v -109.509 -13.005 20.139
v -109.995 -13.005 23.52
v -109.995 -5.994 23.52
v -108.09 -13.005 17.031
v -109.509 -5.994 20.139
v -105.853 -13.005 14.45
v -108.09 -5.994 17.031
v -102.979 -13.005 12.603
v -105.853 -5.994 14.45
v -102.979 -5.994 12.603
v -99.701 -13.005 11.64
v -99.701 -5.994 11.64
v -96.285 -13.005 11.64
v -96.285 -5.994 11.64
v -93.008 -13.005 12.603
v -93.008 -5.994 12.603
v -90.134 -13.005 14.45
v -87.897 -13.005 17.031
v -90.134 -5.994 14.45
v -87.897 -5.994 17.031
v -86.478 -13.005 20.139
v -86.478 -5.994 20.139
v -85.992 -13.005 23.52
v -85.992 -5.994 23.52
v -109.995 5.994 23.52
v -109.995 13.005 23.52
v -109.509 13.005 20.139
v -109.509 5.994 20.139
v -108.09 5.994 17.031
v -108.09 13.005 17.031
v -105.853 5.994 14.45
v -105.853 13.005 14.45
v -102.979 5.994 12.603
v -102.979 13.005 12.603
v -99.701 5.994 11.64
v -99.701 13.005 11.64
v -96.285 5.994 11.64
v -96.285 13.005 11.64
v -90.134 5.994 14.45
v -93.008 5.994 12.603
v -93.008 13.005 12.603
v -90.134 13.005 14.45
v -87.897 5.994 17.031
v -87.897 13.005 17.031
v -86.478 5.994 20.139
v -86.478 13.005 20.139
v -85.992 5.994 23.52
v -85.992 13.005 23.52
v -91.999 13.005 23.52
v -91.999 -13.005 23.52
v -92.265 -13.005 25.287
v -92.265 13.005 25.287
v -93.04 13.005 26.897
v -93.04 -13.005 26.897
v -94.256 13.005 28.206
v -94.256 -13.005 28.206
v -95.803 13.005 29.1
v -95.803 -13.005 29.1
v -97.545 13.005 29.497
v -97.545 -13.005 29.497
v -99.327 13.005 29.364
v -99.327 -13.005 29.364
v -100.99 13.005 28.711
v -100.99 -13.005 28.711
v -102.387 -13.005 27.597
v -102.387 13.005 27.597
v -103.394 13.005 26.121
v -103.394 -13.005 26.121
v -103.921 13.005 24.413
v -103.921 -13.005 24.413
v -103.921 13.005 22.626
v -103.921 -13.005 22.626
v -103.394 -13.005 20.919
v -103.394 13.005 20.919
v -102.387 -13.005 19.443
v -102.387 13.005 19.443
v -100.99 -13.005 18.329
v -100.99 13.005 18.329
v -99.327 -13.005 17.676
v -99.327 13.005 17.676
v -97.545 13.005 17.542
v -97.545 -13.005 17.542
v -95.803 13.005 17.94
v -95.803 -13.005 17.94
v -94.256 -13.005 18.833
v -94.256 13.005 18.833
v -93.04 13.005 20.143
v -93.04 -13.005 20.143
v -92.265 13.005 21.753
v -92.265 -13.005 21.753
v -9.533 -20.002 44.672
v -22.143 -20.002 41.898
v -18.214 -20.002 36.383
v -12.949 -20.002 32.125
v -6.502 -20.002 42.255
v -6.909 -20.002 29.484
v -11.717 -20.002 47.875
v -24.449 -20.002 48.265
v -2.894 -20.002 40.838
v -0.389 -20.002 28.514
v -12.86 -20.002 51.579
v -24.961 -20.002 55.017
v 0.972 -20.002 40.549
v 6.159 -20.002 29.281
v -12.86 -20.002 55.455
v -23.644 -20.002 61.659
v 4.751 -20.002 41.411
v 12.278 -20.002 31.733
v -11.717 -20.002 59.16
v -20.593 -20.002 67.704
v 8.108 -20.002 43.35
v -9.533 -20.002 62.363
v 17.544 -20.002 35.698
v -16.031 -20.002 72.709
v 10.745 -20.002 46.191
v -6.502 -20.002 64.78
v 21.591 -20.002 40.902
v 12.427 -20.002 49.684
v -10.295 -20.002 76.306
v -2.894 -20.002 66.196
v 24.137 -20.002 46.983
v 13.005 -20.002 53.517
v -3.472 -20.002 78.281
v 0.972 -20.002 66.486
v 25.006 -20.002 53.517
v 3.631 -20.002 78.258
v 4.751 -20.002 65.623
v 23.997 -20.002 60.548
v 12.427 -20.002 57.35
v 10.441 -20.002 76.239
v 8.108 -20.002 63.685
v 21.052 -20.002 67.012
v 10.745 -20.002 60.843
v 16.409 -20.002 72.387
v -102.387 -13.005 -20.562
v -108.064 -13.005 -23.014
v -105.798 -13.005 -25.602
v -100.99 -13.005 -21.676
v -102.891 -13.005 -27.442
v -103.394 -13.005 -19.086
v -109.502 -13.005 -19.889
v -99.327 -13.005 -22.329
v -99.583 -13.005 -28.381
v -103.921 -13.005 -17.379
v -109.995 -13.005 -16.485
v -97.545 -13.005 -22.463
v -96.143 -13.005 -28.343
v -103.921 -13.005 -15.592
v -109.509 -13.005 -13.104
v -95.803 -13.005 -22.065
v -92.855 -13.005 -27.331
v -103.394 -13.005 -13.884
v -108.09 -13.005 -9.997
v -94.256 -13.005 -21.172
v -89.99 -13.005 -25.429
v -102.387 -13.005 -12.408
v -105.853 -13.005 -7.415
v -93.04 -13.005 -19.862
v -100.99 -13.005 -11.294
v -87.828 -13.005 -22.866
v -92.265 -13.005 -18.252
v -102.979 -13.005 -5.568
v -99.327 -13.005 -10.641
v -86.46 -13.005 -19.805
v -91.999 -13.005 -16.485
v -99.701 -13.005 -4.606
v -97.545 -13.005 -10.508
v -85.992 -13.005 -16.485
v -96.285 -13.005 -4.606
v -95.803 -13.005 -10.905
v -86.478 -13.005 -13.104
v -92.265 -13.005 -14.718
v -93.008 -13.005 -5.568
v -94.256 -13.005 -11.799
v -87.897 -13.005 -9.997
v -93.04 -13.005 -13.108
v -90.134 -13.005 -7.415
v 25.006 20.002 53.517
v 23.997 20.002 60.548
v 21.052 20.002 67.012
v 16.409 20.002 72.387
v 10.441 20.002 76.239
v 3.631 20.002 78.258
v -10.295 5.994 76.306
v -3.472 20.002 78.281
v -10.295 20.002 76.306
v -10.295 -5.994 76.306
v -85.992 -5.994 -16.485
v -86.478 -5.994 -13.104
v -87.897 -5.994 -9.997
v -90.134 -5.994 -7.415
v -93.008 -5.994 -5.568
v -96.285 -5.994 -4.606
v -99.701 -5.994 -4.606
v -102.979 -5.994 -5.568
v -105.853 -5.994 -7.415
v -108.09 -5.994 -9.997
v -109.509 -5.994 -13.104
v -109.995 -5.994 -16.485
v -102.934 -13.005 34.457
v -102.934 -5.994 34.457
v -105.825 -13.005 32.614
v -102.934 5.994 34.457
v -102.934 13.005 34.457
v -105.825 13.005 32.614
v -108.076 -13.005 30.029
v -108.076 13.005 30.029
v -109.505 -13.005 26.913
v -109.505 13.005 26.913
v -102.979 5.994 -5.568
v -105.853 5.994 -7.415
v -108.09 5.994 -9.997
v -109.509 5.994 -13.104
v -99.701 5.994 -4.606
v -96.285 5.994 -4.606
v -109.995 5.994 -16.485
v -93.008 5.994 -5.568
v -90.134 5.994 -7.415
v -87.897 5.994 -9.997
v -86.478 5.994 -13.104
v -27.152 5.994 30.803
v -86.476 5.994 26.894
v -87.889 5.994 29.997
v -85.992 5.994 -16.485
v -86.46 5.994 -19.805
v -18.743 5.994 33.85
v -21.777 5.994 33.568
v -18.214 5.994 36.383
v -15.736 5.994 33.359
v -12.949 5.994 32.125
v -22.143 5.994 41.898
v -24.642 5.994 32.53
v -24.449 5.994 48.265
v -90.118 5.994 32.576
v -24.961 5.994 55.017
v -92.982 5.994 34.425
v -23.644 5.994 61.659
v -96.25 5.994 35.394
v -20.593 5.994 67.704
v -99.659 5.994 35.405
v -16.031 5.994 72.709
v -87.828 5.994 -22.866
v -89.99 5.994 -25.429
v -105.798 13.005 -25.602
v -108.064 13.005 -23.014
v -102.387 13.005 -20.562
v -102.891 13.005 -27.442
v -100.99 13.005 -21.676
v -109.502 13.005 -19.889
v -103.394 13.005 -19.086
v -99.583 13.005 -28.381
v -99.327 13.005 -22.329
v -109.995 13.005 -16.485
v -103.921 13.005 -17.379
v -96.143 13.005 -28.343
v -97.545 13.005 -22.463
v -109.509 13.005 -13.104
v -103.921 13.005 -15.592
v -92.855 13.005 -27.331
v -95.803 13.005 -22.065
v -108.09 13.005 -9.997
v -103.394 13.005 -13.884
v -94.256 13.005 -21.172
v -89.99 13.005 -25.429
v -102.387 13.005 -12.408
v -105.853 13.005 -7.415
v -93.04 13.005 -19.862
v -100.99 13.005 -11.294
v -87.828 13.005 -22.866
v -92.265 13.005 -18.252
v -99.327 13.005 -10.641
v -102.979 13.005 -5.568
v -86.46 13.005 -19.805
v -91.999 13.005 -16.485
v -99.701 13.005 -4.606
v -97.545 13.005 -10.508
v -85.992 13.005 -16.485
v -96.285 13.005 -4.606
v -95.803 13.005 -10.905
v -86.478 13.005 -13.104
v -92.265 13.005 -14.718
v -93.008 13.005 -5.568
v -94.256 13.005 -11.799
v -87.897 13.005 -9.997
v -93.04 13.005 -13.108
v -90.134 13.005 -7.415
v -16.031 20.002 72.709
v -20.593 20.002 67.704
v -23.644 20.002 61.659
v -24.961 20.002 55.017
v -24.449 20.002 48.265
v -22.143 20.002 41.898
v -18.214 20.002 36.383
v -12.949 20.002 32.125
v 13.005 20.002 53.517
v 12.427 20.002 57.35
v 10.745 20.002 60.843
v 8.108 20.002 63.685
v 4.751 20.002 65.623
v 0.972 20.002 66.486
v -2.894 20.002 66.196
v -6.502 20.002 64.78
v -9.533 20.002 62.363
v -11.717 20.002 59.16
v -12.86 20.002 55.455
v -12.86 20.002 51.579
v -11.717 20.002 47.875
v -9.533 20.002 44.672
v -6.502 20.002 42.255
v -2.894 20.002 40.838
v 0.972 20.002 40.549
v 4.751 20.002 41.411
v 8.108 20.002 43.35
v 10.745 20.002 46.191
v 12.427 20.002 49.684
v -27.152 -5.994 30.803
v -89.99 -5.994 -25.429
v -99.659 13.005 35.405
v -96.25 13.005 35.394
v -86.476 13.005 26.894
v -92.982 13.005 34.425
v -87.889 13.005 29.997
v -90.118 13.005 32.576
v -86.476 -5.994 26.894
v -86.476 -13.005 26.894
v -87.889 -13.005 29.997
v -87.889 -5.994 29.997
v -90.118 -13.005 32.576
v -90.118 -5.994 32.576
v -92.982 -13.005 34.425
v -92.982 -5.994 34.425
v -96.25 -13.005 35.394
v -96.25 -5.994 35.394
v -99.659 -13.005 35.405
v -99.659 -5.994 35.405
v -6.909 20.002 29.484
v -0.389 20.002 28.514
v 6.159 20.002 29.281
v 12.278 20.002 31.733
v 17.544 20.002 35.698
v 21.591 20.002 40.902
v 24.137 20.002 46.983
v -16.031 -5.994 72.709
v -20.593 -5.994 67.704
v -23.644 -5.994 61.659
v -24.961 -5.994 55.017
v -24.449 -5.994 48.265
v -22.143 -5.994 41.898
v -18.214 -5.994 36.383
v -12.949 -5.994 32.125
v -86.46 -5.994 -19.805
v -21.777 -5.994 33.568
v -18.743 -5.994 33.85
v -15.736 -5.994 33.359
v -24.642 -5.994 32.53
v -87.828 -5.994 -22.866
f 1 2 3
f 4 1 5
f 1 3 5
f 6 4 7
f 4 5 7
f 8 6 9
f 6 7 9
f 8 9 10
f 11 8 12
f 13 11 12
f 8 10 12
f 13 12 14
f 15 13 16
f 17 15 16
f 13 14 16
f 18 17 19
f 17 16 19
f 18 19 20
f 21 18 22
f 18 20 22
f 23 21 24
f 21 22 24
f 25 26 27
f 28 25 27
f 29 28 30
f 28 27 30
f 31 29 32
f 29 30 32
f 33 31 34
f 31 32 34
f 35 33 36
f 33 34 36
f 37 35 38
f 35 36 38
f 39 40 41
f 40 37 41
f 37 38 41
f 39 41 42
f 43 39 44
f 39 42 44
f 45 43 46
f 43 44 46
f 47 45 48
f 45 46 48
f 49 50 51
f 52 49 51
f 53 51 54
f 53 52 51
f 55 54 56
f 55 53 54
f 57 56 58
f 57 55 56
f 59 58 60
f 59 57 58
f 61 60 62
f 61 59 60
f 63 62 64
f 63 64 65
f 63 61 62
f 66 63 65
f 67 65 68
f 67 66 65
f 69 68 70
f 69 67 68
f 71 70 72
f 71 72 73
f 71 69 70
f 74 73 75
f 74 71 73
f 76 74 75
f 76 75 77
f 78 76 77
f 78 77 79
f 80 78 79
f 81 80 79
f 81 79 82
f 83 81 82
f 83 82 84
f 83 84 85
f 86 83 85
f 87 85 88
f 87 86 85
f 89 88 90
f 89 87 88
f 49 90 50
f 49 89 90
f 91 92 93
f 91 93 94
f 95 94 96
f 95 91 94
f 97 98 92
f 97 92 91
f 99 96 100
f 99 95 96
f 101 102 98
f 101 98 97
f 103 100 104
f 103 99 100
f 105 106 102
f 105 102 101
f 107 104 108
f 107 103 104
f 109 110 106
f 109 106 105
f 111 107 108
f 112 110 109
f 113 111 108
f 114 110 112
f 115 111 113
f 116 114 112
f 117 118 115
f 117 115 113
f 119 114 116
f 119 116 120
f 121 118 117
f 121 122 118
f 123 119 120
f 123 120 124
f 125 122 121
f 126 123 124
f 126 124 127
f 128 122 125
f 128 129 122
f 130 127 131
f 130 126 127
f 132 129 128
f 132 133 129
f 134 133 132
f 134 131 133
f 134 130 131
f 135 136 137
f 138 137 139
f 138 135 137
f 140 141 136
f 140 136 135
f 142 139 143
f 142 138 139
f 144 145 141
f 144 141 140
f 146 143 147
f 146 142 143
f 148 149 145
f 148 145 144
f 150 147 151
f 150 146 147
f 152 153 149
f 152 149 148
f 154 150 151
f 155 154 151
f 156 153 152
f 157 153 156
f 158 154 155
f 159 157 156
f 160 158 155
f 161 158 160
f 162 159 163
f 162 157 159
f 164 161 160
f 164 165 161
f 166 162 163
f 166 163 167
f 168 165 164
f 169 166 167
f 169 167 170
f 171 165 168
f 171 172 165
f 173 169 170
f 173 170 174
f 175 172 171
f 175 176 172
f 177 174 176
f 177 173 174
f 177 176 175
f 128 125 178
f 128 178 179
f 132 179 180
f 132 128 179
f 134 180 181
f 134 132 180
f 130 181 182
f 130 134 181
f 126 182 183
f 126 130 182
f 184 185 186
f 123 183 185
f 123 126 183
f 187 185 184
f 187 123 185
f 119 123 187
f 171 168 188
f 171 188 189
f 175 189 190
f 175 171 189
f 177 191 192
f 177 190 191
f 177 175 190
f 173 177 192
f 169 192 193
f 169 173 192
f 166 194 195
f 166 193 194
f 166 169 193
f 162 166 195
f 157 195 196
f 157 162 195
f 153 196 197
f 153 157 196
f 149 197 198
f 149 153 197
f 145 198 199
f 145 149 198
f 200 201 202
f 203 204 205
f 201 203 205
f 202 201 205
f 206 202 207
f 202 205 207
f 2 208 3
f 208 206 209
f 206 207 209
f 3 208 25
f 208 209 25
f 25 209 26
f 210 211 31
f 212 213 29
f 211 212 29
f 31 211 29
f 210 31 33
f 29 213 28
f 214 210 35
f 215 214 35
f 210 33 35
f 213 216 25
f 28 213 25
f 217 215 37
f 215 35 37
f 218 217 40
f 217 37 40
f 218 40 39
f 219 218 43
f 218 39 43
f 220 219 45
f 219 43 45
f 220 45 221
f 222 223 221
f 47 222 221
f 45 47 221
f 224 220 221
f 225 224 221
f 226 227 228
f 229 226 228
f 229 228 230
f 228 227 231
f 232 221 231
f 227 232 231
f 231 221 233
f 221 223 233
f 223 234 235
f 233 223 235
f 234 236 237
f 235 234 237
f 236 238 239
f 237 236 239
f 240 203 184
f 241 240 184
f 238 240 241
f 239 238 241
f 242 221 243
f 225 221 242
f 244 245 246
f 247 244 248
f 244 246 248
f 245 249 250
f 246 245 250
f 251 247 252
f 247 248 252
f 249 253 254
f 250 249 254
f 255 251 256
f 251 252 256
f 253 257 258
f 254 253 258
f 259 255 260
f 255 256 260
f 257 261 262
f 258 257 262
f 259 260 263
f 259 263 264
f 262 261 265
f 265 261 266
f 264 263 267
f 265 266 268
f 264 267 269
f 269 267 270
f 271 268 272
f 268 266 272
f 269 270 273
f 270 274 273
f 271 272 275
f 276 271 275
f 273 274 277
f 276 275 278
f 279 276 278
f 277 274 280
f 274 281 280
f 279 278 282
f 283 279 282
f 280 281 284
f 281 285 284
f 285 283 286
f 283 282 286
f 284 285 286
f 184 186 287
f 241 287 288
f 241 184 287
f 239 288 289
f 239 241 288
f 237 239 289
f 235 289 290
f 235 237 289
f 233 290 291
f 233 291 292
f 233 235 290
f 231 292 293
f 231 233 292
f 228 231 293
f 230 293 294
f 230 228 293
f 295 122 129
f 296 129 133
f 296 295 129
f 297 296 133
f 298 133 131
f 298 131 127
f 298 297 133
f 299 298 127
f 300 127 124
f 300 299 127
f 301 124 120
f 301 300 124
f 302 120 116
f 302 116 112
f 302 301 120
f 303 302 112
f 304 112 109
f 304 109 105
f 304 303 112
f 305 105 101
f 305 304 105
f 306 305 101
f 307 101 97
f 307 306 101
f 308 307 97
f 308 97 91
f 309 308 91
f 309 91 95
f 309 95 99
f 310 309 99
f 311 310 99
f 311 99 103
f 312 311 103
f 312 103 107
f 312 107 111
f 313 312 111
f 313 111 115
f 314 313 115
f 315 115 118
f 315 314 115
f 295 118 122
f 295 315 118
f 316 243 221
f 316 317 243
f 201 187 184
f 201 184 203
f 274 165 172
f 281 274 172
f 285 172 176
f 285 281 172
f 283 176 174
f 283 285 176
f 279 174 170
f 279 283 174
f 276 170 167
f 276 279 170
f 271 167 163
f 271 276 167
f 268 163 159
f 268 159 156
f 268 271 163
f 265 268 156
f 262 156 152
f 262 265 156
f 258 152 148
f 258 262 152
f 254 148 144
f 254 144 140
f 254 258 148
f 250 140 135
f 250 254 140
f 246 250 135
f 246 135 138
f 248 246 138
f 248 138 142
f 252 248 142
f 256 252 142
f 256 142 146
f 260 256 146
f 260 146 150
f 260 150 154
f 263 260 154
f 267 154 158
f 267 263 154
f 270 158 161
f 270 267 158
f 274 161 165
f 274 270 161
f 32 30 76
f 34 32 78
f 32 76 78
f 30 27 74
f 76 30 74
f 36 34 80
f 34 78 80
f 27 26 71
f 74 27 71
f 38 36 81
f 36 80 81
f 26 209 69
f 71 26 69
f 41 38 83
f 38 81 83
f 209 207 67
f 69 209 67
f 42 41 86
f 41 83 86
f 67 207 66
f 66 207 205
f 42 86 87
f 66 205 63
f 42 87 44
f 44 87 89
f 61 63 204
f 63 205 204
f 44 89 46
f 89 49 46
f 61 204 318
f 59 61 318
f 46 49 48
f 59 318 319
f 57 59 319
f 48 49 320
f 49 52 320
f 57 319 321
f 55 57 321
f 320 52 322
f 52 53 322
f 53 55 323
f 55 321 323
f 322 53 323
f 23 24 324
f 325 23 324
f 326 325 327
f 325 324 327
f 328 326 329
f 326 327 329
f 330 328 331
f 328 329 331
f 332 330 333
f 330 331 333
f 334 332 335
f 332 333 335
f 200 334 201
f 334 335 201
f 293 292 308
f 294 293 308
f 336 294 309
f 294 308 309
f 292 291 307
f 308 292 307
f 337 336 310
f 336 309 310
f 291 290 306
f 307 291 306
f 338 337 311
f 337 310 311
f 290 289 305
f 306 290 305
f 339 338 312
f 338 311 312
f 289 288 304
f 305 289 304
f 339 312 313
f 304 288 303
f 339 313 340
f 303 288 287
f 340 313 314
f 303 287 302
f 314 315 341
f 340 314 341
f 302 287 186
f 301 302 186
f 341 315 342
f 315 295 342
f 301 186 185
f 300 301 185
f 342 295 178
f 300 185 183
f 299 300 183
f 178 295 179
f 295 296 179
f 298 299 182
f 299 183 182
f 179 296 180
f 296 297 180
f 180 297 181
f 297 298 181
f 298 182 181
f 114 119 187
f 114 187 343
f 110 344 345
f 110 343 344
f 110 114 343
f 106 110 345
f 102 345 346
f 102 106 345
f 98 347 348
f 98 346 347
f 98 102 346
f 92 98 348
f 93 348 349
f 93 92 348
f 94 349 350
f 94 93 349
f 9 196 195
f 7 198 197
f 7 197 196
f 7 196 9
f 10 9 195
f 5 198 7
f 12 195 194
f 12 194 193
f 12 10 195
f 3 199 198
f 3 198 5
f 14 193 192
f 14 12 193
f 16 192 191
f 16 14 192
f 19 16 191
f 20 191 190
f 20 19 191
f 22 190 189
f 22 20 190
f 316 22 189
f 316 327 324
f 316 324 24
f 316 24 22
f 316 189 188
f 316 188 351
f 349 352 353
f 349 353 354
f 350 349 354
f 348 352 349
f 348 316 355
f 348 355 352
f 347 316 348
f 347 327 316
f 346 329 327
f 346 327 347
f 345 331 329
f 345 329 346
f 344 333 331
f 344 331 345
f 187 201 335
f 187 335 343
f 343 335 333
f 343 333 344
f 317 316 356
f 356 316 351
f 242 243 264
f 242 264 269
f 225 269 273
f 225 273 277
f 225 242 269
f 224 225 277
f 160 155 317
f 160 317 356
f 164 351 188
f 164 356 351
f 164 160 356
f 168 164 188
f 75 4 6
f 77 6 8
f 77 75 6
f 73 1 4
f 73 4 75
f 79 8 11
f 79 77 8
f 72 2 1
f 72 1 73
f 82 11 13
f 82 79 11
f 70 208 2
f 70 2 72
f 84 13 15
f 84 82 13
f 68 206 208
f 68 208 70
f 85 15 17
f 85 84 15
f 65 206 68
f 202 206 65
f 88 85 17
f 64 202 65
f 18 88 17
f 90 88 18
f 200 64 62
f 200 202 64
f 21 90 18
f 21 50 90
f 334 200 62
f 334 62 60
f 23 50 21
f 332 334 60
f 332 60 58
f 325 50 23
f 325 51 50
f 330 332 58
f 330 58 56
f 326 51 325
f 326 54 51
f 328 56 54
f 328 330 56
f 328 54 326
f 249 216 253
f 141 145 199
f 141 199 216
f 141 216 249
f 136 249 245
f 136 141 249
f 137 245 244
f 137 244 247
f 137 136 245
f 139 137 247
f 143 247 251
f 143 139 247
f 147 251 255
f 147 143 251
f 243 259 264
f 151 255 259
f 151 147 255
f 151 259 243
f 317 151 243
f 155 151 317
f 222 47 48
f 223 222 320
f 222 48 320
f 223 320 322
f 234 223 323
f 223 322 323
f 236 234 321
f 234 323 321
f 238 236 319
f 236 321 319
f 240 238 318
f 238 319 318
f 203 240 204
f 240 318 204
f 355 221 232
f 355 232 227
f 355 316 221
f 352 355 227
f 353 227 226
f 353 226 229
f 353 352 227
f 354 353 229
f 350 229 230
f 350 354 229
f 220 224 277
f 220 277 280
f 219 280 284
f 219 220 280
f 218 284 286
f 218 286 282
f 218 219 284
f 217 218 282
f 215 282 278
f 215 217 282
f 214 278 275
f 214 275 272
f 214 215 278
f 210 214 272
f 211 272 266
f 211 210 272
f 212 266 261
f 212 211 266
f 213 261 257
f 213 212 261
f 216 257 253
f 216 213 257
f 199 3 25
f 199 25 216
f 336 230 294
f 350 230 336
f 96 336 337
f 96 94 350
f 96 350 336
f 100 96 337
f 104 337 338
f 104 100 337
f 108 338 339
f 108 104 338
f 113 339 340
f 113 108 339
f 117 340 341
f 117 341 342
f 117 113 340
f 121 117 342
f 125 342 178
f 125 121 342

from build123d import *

# Parameters (mm, degrees)
F1_DEPTH = 5.9944
F0_R     = 13.0048
F2_DEPTH = 20.0025
F0_R_2   = 5.9944
F3_DEPTH = 13.0048


with BuildPart() as f1:
    # F0 (on Front) → F1 (new body, symmetric)
    with BuildSketch(Plane.XZ):
        with BuildLine():
            ThreePointArc((-12.949346, 32.124952), (-24.961282, 55.017041), (-10.294693, 76.306136))
            Line((-10.294693, 76.306136), (-102.934025, 34.457115))
            ThreePointArc((-102.934025, 34.457115), (-91.484026, 33.602816), (-85.9917, 23.519828))
            ThreePointArc((-85.9917, 23.519828), (-97.9932, 11.518328), (-109.9947, 23.519828))
            Line((-109.9947, 23.519828), (-109.9947, -16.485172))
            ThreePointArc((-109.9947, -16.485172), (-97.9932, -4.483672), (-85.9917, -16.485172))
            ThreePointArc((-85.9917, -16.485172), (-87.036779, -21.383422), (-89.990008, -25.428602))
            Line((-89.990008, -25.428602), (-27.152389, 30.802793))
            ThreePointArc((-27.152389, 30.802793), (-20.268898, 33.806017), (-12.949346, 32.124952))
        make_face()
    extrude(amount=F1_DEPTH, both=True)

    # F0 (on Front) → F2 (join, symmetric)
    with BuildSketch(Plane.XZ):
        with BuildLine():
            ThreePointArc((-12.949346, 32.124952), (12.278025, 31.732712), (25.0063, 53.517228))
            ThreePointArc((25.0063, 53.517228), (13.562501, 74.526121), (-10.294693, 76.306136))
            ThreePointArc((-10.294693, 76.306136), (-24.961282, 55.017041), (-12.949346, 32.124952))
        make_face()
        with Locations((0, 53.517228)):
            Circle(F0_R, mode=Mode.SUBTRACT)
    extrude(amount=F2_DEPTH, both=True)

    # F0 (on Front) → F3 (join, symmetric)
    with BuildSketch(Plane.XZ):
        with BuildLine():
            ThreePointArc((-85.9917, 23.519828), (-91.484026, 33.602816), (-102.934025, 34.457115))
            ThreePointArc((-102.934025, 34.457115), (-108.076189, 30.029001), (-109.9947, 23.519828))
            ThreePointArc((-109.9947, 23.519828), (-97.9932, 11.518328), (-85.9917, 23.519828))
        make_face()
        with Locations((-97.9932, 23.519828)):
            Circle(F0_R_2, mode=Mode.SUBTRACT)
        with BuildLine():
            ThreePointArc((-109.9947, -16.485172), (-102.89145, -27.441593), (-89.990008, -25.428602))
            ThreePointArc((-89.990008, -25.428602), (-87.036779, -21.383422), (-85.9917, -16.485172))
            ThreePointArc((-85.9917, -16.485172), (-97.9932, -4.483672), (-109.9947, -16.485172))
        make_face()
        with Locations((-97.9932, -16.485172)):
            Circle(F0_R_2, mode=Mode.SUBTRACT)
    extrude(amount=F3_DEPTH, both=True)


solid = f1.part
